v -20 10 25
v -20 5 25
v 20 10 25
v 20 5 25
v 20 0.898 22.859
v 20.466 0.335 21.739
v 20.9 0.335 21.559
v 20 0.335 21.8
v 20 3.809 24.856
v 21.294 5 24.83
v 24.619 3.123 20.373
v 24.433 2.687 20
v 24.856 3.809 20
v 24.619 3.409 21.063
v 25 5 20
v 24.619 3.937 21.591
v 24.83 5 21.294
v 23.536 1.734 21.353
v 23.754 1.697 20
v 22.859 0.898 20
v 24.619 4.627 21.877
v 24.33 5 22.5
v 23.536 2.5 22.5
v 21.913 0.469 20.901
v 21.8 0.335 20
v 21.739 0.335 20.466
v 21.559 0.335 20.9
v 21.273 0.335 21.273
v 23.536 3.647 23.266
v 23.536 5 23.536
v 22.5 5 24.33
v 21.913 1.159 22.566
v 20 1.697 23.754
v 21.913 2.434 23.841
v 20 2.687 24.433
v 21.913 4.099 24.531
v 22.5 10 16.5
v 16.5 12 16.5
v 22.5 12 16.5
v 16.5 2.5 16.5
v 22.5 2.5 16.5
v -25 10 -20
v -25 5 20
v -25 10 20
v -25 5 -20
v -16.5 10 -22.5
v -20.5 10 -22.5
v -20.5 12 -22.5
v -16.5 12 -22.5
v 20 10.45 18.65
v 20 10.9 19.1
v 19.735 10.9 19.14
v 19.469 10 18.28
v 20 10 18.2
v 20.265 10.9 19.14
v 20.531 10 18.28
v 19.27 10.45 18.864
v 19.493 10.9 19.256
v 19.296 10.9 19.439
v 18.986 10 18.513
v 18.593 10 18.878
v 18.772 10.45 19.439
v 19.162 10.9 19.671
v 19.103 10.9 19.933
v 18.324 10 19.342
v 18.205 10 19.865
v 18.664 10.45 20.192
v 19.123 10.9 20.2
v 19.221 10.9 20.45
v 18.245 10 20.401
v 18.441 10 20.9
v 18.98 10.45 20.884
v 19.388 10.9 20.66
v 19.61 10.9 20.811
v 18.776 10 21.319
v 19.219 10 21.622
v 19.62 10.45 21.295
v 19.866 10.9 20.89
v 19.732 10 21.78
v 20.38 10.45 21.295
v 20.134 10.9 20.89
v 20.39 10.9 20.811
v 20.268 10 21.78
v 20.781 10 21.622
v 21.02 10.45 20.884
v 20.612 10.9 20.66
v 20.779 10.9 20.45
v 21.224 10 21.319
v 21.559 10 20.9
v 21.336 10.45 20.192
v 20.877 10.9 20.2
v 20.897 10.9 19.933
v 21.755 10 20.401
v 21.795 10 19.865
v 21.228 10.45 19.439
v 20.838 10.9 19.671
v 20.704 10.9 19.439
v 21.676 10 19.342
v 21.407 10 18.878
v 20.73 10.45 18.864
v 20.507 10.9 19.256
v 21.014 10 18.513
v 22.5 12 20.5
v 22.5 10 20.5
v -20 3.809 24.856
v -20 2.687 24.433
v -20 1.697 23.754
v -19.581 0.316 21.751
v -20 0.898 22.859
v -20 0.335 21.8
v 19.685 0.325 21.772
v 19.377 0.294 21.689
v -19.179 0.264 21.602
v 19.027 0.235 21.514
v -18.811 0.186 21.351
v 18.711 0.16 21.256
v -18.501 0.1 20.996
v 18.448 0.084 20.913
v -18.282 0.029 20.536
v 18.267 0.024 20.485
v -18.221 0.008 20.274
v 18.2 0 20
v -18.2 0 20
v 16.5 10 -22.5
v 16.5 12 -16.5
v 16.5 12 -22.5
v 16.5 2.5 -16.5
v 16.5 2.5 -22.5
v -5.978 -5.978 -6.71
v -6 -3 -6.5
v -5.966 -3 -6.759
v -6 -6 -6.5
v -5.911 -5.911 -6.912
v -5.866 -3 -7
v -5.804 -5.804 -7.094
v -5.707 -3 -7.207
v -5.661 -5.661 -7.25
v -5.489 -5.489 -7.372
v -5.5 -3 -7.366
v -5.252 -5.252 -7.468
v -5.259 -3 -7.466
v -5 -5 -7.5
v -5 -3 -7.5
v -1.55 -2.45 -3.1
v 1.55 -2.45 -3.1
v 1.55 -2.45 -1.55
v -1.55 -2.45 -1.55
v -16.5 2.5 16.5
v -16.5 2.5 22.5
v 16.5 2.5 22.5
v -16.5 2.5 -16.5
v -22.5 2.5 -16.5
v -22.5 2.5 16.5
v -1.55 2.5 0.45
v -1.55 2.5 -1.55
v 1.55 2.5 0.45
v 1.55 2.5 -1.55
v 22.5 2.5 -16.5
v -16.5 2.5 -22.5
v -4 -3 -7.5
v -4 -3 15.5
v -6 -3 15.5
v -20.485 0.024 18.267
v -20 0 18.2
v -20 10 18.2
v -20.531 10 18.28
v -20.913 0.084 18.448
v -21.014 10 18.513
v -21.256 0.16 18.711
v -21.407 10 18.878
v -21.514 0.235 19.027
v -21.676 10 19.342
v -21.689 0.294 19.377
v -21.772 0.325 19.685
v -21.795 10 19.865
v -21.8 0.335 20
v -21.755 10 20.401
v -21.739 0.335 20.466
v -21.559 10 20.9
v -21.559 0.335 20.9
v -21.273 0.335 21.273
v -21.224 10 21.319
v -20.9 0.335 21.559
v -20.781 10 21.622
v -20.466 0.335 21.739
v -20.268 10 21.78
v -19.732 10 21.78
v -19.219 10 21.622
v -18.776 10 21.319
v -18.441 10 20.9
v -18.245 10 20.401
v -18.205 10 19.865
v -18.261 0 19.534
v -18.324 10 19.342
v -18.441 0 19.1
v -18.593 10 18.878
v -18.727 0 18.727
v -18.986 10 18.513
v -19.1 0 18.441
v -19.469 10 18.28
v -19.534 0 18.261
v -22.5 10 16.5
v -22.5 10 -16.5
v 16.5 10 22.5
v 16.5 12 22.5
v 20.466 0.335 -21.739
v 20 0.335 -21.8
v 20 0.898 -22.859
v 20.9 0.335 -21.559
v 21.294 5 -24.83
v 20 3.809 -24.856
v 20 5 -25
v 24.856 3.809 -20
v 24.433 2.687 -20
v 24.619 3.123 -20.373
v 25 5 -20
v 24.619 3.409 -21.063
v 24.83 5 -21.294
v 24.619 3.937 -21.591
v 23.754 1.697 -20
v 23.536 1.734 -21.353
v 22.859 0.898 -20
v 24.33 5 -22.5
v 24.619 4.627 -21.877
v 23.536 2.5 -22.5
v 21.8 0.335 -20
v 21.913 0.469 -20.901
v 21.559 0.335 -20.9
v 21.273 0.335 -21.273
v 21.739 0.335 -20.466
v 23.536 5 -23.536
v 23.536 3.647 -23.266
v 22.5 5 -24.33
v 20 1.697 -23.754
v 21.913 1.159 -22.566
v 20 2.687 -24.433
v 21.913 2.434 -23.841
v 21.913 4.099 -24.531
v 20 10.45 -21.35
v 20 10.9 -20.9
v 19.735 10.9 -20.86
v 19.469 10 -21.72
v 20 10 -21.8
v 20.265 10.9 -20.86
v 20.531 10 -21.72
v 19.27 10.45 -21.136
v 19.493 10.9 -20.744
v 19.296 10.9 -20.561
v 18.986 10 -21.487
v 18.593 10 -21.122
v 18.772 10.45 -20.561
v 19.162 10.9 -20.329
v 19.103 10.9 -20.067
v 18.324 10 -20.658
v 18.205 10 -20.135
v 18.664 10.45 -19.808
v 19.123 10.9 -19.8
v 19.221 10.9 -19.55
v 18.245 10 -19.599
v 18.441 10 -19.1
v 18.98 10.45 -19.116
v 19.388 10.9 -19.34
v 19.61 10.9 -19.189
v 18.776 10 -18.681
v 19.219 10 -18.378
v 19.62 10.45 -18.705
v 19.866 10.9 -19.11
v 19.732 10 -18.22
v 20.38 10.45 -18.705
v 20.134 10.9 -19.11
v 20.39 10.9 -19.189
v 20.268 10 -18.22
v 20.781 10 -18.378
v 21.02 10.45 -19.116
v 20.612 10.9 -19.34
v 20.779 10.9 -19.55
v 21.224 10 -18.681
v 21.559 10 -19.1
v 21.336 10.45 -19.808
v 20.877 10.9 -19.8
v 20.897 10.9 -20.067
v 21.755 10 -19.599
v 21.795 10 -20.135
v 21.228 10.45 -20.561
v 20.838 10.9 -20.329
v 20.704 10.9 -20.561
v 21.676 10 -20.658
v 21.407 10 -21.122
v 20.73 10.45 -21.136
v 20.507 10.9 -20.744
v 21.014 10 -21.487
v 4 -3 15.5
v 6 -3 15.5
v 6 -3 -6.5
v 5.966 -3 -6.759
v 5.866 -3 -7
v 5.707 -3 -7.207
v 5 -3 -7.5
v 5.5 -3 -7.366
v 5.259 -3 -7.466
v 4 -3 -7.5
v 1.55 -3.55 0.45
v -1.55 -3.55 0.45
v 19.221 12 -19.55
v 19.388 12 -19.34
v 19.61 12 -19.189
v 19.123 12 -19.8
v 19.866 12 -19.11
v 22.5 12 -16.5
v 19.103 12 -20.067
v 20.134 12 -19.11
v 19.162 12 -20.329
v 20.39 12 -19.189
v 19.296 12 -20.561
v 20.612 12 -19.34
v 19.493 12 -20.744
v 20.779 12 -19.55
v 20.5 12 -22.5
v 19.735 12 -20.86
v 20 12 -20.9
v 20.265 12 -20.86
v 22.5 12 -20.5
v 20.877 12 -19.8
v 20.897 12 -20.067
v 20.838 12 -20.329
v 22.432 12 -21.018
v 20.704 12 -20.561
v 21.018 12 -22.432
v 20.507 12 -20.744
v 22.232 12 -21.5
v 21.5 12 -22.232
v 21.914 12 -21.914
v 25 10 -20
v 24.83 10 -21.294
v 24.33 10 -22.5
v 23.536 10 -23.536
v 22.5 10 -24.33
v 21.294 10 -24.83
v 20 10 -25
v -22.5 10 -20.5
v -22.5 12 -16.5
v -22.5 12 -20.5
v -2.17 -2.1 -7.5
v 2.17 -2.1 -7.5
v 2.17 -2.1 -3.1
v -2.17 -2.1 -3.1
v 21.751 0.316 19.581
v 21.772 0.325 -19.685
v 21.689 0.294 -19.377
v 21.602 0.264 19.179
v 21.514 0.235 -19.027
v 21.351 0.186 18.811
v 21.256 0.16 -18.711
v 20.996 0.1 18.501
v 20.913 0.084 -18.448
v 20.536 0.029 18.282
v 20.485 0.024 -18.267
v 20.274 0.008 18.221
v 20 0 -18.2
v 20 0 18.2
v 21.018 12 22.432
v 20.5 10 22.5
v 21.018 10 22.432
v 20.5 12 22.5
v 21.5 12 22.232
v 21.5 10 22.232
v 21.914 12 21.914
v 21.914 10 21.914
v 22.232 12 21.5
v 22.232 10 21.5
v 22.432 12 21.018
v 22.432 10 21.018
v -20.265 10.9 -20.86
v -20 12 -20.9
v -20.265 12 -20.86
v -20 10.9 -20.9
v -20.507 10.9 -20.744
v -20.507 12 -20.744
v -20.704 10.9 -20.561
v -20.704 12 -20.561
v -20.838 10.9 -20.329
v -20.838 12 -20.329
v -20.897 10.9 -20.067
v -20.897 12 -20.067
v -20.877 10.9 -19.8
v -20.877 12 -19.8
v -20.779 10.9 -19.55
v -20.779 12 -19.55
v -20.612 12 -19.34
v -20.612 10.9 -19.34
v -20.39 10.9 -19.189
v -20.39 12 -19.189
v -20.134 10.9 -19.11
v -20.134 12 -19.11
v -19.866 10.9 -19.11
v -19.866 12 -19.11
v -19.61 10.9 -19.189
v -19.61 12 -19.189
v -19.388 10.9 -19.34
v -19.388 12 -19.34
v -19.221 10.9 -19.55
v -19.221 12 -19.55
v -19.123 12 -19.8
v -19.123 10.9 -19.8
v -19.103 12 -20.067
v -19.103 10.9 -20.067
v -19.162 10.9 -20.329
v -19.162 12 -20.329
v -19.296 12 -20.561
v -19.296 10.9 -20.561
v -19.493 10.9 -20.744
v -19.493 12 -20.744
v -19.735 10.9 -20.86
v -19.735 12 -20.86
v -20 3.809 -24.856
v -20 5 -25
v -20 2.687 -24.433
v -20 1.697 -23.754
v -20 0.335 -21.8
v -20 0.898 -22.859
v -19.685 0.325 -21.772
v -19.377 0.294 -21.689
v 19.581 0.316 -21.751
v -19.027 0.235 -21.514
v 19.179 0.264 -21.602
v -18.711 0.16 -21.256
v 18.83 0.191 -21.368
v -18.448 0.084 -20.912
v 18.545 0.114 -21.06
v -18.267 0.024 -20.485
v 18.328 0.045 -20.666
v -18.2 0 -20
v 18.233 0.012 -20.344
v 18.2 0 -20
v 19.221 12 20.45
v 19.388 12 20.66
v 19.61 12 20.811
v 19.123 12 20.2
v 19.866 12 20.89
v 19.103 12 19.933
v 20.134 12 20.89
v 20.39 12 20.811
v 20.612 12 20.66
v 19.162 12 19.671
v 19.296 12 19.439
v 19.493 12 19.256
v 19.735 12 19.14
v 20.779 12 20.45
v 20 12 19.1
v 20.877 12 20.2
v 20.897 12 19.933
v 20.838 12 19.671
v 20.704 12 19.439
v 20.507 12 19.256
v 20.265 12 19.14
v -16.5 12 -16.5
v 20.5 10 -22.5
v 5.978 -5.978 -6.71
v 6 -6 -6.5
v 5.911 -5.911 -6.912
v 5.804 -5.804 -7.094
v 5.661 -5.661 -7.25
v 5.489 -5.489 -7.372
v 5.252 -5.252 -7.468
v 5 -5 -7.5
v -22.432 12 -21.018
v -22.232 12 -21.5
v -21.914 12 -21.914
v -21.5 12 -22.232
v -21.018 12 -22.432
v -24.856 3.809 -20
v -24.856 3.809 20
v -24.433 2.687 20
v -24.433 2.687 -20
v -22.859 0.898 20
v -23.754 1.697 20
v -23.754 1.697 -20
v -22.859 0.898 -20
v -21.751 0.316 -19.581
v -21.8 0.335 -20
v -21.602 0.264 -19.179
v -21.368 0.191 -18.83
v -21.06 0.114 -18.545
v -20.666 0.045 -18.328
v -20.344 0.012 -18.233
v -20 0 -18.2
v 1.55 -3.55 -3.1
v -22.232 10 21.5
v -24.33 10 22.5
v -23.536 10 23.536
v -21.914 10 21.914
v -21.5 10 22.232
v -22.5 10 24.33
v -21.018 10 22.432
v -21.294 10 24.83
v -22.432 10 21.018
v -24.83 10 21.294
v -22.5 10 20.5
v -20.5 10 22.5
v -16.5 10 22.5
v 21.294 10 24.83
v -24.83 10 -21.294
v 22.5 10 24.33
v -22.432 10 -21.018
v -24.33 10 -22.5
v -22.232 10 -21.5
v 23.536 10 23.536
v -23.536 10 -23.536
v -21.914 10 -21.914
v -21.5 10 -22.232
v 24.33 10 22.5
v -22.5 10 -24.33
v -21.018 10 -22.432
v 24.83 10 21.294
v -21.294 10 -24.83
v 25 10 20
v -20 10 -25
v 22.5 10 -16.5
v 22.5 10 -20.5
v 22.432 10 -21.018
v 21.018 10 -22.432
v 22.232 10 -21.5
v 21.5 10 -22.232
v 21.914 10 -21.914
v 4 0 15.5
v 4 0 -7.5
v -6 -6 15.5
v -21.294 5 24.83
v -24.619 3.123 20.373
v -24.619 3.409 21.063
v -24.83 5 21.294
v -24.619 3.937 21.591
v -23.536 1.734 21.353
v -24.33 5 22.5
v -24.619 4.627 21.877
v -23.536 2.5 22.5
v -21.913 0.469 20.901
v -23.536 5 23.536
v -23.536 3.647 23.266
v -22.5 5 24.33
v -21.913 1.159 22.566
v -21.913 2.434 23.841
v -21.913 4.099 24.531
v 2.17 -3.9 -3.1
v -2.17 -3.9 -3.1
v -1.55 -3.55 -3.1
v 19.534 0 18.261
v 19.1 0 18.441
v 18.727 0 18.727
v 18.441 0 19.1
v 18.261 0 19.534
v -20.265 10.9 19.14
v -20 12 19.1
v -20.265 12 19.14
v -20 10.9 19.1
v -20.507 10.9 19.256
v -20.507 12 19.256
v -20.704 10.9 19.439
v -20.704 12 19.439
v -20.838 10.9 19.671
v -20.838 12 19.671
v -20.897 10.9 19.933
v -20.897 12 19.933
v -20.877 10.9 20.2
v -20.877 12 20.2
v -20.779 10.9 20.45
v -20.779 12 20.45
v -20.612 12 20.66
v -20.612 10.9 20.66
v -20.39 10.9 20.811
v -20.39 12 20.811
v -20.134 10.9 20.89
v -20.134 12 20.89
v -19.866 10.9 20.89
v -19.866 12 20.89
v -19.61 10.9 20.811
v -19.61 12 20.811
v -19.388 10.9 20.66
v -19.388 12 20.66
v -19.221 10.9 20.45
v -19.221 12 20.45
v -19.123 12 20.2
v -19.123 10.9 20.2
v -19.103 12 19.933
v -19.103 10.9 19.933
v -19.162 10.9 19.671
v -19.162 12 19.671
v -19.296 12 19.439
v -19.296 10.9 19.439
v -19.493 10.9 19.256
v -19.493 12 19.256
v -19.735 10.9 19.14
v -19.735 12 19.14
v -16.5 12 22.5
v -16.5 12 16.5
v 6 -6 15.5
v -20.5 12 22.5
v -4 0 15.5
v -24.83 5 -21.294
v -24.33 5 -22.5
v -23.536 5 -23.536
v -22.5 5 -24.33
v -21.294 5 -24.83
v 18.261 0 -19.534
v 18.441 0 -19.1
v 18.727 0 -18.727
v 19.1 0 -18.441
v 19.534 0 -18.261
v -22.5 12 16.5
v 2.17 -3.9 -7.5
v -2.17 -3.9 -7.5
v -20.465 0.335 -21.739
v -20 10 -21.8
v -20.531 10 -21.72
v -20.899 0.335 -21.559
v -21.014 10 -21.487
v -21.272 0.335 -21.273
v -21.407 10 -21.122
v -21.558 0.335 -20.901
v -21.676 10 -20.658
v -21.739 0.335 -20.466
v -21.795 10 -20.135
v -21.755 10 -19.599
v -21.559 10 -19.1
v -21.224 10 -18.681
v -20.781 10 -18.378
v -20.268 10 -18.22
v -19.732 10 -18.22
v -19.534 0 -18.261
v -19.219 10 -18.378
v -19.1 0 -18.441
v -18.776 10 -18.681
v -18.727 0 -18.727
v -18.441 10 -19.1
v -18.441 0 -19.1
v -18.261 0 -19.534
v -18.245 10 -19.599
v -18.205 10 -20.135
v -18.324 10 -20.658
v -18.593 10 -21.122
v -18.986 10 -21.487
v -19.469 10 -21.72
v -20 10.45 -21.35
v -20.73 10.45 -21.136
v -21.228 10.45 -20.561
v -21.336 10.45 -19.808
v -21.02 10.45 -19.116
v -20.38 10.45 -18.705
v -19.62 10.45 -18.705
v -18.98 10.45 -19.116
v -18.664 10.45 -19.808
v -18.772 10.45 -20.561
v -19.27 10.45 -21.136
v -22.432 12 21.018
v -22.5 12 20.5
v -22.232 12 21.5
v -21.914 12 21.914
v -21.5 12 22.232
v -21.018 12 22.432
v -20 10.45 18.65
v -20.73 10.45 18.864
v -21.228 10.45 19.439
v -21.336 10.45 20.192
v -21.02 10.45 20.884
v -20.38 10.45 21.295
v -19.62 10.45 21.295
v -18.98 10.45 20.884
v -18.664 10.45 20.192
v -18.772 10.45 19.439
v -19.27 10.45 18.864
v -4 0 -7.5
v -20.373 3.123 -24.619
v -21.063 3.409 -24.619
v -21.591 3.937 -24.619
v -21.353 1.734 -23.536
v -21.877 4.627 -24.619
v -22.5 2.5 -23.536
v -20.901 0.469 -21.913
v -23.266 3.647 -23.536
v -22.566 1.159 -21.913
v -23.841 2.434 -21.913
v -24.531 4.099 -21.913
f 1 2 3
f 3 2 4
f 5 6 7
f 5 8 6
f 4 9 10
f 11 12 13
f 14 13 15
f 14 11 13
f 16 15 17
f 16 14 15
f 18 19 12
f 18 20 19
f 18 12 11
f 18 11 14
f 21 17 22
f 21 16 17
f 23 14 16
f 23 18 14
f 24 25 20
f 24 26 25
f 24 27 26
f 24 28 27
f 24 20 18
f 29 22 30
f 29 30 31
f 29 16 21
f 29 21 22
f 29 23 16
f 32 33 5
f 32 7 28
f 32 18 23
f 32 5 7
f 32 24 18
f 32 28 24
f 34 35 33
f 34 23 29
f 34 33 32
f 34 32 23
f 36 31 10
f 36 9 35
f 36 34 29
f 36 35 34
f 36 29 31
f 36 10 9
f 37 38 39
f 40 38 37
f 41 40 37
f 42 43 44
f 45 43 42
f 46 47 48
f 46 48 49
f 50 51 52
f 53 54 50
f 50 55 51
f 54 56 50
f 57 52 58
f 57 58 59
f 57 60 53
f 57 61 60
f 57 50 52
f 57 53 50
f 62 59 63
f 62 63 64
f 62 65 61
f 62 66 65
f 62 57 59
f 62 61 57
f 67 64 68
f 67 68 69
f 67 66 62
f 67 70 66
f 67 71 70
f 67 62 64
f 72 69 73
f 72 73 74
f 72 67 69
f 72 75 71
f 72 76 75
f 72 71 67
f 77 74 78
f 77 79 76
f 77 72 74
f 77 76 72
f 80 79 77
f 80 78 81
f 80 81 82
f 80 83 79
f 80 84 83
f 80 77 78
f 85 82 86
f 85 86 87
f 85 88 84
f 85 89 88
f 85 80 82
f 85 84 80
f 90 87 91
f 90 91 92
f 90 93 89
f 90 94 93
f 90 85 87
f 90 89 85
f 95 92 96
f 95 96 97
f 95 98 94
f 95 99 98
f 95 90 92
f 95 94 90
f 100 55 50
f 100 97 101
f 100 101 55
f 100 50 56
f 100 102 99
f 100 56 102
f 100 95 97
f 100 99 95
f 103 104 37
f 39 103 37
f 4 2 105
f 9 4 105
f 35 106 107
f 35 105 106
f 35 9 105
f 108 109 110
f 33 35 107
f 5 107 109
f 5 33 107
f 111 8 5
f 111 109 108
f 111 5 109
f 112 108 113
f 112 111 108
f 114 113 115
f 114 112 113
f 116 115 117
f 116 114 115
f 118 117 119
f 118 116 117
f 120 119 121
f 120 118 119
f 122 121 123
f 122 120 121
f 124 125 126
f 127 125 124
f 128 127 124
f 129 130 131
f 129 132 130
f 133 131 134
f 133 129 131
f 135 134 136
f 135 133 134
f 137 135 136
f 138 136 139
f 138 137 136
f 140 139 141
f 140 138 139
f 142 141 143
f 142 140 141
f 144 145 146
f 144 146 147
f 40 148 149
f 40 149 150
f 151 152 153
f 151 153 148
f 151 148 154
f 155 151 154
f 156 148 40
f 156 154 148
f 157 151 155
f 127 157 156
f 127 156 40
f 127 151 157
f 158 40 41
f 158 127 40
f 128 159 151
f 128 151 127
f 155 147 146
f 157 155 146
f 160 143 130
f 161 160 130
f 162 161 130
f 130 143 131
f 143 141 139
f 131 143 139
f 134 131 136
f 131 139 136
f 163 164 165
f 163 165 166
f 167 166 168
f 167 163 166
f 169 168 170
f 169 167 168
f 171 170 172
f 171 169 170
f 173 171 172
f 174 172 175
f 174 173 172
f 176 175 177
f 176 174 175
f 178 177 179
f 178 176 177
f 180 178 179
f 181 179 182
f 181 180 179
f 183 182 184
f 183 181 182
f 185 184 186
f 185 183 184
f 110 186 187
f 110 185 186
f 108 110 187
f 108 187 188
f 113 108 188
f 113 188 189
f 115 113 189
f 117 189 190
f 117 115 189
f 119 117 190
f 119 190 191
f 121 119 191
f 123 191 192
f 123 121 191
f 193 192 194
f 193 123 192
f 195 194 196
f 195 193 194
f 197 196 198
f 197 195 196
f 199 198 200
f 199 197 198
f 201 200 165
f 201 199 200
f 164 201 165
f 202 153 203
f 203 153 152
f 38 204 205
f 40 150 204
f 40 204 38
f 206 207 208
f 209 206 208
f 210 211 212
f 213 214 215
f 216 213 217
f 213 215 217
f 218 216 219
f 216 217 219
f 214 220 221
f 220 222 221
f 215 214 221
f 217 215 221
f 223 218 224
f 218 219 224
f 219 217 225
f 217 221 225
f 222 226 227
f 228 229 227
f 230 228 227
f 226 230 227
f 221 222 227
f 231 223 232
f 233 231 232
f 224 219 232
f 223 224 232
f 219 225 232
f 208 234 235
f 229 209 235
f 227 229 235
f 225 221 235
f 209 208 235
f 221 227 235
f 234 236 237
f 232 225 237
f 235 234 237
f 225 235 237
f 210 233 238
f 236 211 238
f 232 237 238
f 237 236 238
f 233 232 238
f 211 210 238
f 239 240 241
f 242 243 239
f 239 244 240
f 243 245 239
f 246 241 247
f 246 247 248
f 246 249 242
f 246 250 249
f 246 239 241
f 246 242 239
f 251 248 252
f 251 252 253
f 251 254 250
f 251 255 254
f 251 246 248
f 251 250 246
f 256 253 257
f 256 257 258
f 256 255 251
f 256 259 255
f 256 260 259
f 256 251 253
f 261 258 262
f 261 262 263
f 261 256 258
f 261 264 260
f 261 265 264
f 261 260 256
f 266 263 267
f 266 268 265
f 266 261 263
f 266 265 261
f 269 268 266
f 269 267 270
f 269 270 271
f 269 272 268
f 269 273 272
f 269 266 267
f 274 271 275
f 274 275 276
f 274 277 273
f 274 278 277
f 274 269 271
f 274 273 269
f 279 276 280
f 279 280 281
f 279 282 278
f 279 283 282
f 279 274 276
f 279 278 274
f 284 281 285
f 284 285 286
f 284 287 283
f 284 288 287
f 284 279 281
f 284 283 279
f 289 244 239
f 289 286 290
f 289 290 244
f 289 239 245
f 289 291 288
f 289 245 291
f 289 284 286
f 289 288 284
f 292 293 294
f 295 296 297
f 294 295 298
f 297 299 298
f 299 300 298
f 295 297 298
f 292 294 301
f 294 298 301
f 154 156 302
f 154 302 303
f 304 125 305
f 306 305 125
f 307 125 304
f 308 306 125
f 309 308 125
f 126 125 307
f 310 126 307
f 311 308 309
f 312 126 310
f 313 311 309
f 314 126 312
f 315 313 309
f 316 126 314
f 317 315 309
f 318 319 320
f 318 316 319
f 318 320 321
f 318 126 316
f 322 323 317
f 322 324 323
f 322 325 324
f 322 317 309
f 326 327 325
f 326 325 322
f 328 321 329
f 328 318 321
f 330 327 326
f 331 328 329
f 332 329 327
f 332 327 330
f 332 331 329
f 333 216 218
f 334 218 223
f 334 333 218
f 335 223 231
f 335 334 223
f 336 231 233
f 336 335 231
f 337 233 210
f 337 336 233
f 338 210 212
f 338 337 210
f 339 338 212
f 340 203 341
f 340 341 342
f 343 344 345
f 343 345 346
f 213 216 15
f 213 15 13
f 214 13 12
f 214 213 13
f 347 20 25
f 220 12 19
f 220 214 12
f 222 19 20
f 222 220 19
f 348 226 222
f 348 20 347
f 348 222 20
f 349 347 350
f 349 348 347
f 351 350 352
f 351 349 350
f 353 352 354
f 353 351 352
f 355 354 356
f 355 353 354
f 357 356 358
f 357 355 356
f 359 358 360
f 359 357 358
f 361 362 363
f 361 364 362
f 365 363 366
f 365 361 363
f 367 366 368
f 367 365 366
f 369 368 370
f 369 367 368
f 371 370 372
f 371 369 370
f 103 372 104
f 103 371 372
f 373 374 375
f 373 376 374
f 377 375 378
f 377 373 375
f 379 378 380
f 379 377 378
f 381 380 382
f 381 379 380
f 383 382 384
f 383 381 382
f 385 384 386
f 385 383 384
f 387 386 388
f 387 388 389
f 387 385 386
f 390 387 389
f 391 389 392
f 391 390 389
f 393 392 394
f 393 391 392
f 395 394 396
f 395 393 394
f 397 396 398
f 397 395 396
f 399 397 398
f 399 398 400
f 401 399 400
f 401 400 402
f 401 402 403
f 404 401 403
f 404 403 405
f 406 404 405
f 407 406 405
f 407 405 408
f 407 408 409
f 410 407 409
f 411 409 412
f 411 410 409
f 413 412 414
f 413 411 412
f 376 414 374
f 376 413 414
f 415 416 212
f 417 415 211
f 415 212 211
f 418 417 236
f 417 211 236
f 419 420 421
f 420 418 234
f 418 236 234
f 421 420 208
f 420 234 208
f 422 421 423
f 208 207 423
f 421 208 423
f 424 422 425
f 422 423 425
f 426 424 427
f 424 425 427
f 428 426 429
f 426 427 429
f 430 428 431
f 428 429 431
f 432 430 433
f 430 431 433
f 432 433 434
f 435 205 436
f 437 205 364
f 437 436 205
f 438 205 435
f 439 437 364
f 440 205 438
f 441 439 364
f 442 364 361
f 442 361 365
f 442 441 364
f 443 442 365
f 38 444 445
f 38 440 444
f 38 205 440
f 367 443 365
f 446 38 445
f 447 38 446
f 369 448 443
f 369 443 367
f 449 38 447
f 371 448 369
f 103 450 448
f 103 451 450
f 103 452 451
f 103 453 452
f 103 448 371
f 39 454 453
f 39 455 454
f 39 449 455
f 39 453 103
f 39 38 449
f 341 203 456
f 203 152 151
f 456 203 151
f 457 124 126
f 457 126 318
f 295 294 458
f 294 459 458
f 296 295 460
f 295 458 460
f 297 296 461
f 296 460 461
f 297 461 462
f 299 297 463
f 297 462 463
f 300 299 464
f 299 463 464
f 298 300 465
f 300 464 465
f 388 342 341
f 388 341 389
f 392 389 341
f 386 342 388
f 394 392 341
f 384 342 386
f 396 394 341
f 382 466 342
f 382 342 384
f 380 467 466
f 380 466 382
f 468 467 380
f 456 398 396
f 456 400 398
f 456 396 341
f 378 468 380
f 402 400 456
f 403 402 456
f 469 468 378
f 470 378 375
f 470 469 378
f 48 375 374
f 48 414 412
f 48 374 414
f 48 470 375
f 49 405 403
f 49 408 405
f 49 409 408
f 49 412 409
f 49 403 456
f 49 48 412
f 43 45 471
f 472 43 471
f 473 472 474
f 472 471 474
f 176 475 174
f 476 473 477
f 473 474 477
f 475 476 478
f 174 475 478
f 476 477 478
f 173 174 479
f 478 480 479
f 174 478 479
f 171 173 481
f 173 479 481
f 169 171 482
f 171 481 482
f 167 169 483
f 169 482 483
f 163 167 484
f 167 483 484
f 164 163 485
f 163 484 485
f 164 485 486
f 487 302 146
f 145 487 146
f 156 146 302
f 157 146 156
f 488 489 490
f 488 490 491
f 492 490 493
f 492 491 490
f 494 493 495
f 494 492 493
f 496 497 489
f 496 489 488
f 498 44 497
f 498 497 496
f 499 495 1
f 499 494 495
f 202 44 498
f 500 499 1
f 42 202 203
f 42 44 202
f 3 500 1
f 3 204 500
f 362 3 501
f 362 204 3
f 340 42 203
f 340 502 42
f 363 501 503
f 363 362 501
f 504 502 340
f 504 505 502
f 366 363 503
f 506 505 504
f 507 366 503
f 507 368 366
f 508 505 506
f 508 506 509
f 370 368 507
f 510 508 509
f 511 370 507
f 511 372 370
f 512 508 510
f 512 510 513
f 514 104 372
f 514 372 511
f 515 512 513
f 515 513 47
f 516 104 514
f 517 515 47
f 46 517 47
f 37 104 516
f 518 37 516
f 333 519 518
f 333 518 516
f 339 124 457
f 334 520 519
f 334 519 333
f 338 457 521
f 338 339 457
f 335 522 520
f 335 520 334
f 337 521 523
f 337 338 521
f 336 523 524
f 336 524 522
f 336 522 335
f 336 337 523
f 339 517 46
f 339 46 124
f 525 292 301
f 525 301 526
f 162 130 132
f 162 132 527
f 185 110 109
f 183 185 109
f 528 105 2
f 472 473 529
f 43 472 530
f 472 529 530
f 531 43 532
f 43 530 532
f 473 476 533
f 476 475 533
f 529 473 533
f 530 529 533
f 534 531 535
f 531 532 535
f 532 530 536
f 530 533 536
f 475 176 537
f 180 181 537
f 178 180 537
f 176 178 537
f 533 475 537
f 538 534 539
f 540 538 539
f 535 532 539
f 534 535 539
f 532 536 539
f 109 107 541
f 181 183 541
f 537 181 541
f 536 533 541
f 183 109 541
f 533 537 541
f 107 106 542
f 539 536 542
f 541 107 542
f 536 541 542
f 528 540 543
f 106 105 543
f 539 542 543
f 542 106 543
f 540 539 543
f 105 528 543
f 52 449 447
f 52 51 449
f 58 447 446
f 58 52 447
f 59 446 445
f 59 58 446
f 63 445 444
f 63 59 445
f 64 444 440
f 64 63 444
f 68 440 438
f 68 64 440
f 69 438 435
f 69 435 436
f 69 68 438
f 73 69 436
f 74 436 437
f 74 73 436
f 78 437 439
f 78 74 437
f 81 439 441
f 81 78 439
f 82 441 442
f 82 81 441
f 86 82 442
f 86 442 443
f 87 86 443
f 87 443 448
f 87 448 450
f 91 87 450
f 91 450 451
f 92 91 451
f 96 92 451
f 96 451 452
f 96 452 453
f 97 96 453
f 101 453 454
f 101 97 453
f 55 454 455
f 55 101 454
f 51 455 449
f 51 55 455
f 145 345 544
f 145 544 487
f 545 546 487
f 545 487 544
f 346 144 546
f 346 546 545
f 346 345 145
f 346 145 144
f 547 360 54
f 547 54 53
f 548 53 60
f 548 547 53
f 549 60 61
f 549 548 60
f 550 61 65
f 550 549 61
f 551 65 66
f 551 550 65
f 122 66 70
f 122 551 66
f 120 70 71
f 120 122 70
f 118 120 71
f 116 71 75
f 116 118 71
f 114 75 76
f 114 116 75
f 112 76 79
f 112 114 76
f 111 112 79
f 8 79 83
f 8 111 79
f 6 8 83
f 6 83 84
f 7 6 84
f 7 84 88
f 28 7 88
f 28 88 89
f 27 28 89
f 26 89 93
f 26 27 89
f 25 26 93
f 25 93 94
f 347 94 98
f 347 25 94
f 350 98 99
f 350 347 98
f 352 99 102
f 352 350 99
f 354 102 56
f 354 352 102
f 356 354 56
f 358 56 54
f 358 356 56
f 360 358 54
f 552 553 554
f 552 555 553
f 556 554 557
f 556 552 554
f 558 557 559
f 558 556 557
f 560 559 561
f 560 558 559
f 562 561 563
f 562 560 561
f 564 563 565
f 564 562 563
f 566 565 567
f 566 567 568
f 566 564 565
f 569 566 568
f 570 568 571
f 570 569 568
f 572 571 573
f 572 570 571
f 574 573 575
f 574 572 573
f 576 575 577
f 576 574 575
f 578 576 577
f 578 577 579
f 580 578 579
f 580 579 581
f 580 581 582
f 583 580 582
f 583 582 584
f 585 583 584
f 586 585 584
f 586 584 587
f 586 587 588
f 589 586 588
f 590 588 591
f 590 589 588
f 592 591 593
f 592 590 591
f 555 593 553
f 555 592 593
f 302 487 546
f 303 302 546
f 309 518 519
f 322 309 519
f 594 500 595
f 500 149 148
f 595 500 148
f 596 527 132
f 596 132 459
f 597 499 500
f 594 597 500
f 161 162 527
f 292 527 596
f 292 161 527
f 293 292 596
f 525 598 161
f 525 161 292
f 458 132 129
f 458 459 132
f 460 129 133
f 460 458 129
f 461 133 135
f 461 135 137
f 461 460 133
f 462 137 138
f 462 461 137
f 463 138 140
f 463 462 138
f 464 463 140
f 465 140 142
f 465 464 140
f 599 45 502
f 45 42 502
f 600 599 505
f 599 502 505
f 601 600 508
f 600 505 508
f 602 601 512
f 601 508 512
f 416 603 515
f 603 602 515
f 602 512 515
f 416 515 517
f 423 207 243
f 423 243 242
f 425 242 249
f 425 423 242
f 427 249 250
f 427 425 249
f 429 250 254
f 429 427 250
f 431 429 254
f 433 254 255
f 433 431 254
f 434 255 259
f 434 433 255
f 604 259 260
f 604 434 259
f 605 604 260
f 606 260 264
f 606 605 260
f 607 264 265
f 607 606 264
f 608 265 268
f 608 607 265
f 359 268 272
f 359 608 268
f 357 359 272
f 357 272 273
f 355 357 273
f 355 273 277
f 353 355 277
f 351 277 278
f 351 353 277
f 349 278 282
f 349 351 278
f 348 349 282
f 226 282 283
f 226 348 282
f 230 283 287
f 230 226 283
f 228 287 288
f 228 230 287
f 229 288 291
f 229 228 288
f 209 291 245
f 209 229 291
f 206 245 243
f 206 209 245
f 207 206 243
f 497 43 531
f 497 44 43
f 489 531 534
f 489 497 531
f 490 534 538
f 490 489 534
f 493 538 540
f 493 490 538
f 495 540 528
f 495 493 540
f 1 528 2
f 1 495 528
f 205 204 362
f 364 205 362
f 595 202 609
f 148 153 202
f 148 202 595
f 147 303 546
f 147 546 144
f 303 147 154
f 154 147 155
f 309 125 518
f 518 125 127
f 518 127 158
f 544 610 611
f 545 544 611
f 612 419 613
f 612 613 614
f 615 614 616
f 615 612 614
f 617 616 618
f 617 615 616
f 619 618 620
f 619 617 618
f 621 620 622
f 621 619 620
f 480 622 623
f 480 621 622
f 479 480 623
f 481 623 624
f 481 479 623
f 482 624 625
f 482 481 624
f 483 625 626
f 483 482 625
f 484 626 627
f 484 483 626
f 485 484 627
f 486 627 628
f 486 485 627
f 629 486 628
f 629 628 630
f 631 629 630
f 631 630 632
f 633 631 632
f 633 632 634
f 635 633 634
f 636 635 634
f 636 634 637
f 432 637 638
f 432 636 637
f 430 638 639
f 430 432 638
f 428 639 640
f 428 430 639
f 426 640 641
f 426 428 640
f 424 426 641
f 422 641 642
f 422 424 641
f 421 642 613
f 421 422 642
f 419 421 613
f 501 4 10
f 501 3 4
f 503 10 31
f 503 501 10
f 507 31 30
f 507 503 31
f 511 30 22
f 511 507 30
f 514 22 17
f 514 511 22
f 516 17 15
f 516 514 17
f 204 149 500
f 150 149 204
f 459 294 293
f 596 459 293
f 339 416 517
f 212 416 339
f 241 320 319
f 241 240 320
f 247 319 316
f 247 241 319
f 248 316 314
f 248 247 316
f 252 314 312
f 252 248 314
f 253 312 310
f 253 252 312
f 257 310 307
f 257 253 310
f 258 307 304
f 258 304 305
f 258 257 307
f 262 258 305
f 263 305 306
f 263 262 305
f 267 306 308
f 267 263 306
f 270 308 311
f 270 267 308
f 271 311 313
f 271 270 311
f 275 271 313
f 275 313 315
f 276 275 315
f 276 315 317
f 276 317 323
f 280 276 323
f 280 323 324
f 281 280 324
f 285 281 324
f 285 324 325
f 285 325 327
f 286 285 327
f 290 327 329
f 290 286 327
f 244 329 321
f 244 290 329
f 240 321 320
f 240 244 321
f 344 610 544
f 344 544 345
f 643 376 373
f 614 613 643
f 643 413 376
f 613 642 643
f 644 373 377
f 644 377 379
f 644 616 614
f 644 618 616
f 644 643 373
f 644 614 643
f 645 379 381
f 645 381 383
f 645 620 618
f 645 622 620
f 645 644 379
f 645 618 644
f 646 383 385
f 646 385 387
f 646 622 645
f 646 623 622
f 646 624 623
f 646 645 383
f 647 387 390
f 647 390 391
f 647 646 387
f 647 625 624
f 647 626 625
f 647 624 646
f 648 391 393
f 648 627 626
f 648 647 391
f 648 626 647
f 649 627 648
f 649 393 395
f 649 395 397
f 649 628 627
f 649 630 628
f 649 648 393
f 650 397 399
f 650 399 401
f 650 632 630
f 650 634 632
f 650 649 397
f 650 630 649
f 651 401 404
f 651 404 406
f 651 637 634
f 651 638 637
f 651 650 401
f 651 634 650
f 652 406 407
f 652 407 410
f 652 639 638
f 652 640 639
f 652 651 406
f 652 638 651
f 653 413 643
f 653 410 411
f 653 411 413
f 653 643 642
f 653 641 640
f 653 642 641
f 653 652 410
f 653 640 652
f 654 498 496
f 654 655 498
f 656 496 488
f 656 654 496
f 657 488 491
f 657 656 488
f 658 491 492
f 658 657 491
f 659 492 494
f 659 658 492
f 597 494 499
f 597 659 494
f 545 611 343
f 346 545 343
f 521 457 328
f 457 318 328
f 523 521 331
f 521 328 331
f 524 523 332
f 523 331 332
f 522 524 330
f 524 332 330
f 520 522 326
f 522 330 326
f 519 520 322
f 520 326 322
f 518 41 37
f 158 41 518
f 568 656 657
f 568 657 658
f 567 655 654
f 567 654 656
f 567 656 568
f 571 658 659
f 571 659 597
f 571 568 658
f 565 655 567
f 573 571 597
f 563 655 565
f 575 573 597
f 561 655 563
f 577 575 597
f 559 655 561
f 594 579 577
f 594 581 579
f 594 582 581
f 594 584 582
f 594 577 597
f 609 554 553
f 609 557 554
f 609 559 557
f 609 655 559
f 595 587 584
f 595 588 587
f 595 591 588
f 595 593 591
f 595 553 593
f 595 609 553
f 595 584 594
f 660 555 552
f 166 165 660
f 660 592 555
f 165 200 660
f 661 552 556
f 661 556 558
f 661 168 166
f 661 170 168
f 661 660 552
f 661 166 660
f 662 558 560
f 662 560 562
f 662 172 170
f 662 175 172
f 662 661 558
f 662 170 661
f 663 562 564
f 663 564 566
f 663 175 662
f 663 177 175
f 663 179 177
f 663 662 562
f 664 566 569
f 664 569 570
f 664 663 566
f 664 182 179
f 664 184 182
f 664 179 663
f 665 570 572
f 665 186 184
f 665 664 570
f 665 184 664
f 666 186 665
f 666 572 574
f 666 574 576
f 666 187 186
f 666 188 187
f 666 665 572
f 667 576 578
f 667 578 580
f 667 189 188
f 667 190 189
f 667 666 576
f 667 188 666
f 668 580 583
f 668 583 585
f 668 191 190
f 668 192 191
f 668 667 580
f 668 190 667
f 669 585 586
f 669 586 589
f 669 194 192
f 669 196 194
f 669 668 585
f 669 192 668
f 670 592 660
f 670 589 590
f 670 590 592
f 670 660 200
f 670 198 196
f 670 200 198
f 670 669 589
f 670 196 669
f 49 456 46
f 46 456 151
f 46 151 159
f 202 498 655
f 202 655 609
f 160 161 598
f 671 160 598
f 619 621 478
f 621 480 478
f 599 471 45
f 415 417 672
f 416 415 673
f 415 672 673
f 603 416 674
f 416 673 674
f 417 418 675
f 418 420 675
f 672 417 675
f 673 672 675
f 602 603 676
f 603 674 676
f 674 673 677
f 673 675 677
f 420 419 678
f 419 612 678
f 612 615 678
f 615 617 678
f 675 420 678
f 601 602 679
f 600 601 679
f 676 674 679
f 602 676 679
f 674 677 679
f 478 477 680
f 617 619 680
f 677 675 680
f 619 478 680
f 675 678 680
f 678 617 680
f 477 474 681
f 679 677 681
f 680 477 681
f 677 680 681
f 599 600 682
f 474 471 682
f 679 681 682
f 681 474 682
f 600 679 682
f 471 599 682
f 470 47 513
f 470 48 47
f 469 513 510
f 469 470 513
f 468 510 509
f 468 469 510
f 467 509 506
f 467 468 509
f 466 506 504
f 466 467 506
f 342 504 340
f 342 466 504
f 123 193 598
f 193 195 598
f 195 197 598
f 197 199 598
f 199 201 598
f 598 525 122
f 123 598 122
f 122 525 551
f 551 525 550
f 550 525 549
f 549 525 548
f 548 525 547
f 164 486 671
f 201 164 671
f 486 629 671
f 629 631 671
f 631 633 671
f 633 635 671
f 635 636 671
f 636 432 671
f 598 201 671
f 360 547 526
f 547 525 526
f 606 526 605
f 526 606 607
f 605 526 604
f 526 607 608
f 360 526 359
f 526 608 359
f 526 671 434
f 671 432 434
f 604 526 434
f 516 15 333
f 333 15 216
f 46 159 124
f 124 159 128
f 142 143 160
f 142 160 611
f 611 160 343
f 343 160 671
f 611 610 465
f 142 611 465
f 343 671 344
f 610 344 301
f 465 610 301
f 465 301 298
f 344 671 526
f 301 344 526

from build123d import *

# Parameters (mm, degrees)
SKETCH1_W                                    = 50
SKETCH1_H                                    = 50
BOSS_EXTRUDE1_DEPTH                          = 10
SHELL1_T                                     = -2.5
FILLET1_R                                    = 5
SKETCH2_W                                    = 6
SKETCH2_H                                    = 6
BOSS_EXTRUDE2_DEPTH                          = 9.5
CSK_SLOT_FOR_M1_6_COUNTERSUNK_FLAT_H_2_COUNT = 2
CSK_SLOT_FOR_M1_6_COUNTERSUNK_FLAT_H_2_PITCH = 40
CSK_SLOT_FOR_M1_6_COUNTERSUNK_FLAT_H_3_COUNT = 2
CSK_SLOT_FOR_M1_6_COUNTERSUNK_FLAT_H_3_PITCH = 56.568542495
CSK_SLOT_FOR_M1_6_COUNTERSUNK_FLAT_H_4_COUNT = 2
CSK_SLOT_FOR_M1_6_COUNTERSUNK_FLAT_H_4_PITCH = 40
SKETCH7_W                                    = 12
SKETCH7_H                                    = 23
BOSS_EXTRUDE3_DEPTH                          = 6
SKETCH8_W                                    = 2
SKETCH8_H                                    = 3
CUT_EXTRUDE1_DEPTH                           = 43.72294479
FILLET2_R                                    = 1
SKETCH9_W                                    = 4.34
SKETCH9_H                                    = 1.8
CUT_EXTRUDE2_DEPTH                           = 4.4
SKETCH10_W                                   = 3.1
SKETCH10_H                                   = 1.1
CUT_EXTRUDE3_DEPTH                           = 3.55
CUT_EXTRUDE4_REACH                           = 40.194
SKETCH13_W                                   = 3.1
SKETCH13_H                                   = 2
FILLET3_R                                    = 2


with BuildPart() as part:
    # Sketch1 → Boss-Extrude1 (new body)
    with BuildSketch(Plane(origin=(0, 0, 0), x_dir=(1, 0, 0), z_dir=(0, 1, 0))):
        Rectangle(SKETCH1_W, SKETCH1_H)
    extrude(amount=BOSS_EXTRUDE1_DEPTH)

    # Shell1
    shell1_openings = [part.faces().sort_by_distance(p)[0] for p in [
        (0, 10, 0),
    ]]
    offset(amount=SHELL1_T, openings=shell1_openings, kind=Kind.INTERSECTION)

    # Fillet1
    fillet1_edges = [part.edges().sort_by_distance(p)[0] for p in [
        (0, 0, 25),
        (-25, 0, 0),
        (0, 0, -25),
        (25, 0, 0),
        (25, 5, 25),
        (-25, 5, 25),
        (-25, 5, -25),
        (25, 5, -25),
    ]]
    fillet(fillet1_edges, radius=FILLET1_R)

    # Sketch2 → Boss-Extrude2 (add)
    with BuildSketch(Plane(origin=(0, 2.5, 0), x_dir=(1, 0, 0), z_dir=(0, 1, 0))):
        with Locations((19.5, 19.5)):
            Rectangle(SKETCH2_W, SKETCH2_H)
        with Locations((-19.5, 19.5)):
            Rectangle(SKETCH2_W, SKETCH2_H)
        with Locations((19.5, -19.5)):
            Rectangle(SKETCH2_W, SKETCH2_H)
        with Locations((-19.5, -19.5)):
            Rectangle(SKETCH2_W, SKETCH2_H)
    extrude(amount=BOSS_EXTRUDE2_DEPTH)

    # Sketch6 → CSK SLOT for M1.6 Countersunk Flat Head Screw1 (revolve, cut)
    with BuildSketch(Plane(origin=(20, 0, 20), x_dir=(0, 0, -1), z_dir=(1, 0, 0))):
        Polygon((0, 0), (0, 12), (0.9, 12), (0.9, 10.9), (1.8, 10), (1.8, 0), align=None)
    csk_slot_for_m1_6_countersunk_flat_head = revolve(axis=Axis((20, -6.35, 20), (0, 1, 0)), mode=Mode.SUBTRACT)

    # CSK SLOT for M1.6 Countersunk Flat H 2: CSK SLOT for M1.6 Countersunk Flat Head Screw1 ×2
    with Locations(*[(-i * CSK_SLOT_FOR_M1_6_COUNTERSUNK_FLAT_H_2_PITCH, 0, 0) for i in range(1, CSK_SLOT_FOR_M1_6_COUNTERSUNK_FLAT_H_2_COUNT)]):
        add(csk_slot_for_m1_6_countersunk_flat_head, mode=Mode.SUBTRACT)

    # CSK SLOT for M1.6 Countersunk Flat H 3: CSK SLOT for M1.6 Countersunk Flat Head Screw1 ×2
    with Locations(*[Vector(-0.7071067811865476, 0, -0.7071067811865475) * (i * CSK_SLOT_FOR_M1_6_COUNTERSUNK_FLAT_H_3_PITCH) for i in range(1, CSK_SLOT_FOR_M1_6_COUNTERSUNK_FLAT_H_3_COUNT)]):
        add(csk_slot_for_m1_6_countersunk_flat_head, mode=Mode.SUBTRACT)

    # CSK SLOT for M1.6 Countersunk Flat H 4: CSK SLOT for M1.6 Countersunk Flat Head Screw1 ×2
    with Locations(*[(0, 0, -i * CSK_SLOT_FOR_M1_6_COUNTERSUNK_FLAT_H_4_PITCH) for i in range(1, CSK_SLOT_FOR_M1_6_COUNTERSUNK_FLAT_H_4_COUNT)]):
        add(csk_slot_for_m1_6_countersunk_flat_head, mode=Mode.SUBTRACT)

    # Sketch7 → Boss-Extrude3 (add)
    with BuildSketch(Plane.XZ):
        with Locations((0, 4)):
            Rectangle(SKETCH7_W, SKETCH7_H)
    extrude(amount=BOSS_EXTRUDE3_DEPTH)

    # Sketch8 → Cut-Extrude1 (cut, through all)
    with BuildSketch(Plane(origin=(0, 0, -7.5), x_dir=(-1, 0, 0), z_dir=(0, 0, -1))):
        with Locations((5, -1.5)):
            Rectangle(SKETCH8_W, SKETCH8_H)
        with Locations((-5, -1.5)):
            Rectangle(SKETCH8_W, SKETCH8_H)
    extrude(amount=-CUT_EXTRUDE1_DEPTH, mode=Mode.SUBTRACT)

    # Fillet2
    fillet2_edges = [part.edges().sort_by_distance(p)[0] for p in [
        (-6, -4.5, -7.5),
        (6, -4.5, -7.5),
        (0, -6, -7.5),
    ]]
    fillet(fillet2_edges, radius=FILLET2_R)

    # Sketch9 → Cut-Extrude2 (cut)
    with BuildSketch(Plane(origin=(0, 0, -7.5), x_dir=(-1, 0, 0), z_dir=(0, 0, -1))):
        with Locations((0, -3)):
            Rectangle(SKETCH9_W, SKETCH9_H)
    extrude(amount=-CUT_EXTRUDE2_DEPTH, mode=Mode.SUBTRACT)

    # Sketch10 → Cut-Extrude3 (cut)
    with BuildSketch(Plane(origin=(0, 0, -3.1), x_dir=(-1, 0, 0), z_dir=(0, 0, -1))):
        with Locations((0, -3)):
            Rectangle(SKETCH10_W, SKETCH10_H)
    extrude(amount=-CUT_EXTRUDE3_DEPTH, mode=Mode.SUBTRACT)

    # Sketch13 → Cut-Extrude4 (cut, up to next)
    with BuildSketch(Plane.XZ.offset(2.45), mode=Mode.PRIVATE) as cut_extrude4_sk1:
        with Locations((0, -0.55)):
            Rectangle(SKETCH13_W, SKETCH13_H)
    cut_extrude4_tool1 = extrude(cut_extrude4_sk1.sketch, amount=-CUT_EXTRUDE4_REACH, mode=Mode.PRIVATE) & part.part
    add(cut_extrude4_tool1.solids().sort_by_distance((0, -2.45, -0.55))[0], mode=Mode.SUBTRACT)

    # Fillet3
    fillet3_edges = [part.edges().sort_by_distance(p)[0] for p in [
        (-22.5, 11, 22.5),
        (-22.5, 11, -22.5),
        (22.5, 11, -22.5),
        (22.5, 11, 22.5),
    ]]
    fillet(fillet3_edges, radius=FILLET3_R)


solid = part.part
